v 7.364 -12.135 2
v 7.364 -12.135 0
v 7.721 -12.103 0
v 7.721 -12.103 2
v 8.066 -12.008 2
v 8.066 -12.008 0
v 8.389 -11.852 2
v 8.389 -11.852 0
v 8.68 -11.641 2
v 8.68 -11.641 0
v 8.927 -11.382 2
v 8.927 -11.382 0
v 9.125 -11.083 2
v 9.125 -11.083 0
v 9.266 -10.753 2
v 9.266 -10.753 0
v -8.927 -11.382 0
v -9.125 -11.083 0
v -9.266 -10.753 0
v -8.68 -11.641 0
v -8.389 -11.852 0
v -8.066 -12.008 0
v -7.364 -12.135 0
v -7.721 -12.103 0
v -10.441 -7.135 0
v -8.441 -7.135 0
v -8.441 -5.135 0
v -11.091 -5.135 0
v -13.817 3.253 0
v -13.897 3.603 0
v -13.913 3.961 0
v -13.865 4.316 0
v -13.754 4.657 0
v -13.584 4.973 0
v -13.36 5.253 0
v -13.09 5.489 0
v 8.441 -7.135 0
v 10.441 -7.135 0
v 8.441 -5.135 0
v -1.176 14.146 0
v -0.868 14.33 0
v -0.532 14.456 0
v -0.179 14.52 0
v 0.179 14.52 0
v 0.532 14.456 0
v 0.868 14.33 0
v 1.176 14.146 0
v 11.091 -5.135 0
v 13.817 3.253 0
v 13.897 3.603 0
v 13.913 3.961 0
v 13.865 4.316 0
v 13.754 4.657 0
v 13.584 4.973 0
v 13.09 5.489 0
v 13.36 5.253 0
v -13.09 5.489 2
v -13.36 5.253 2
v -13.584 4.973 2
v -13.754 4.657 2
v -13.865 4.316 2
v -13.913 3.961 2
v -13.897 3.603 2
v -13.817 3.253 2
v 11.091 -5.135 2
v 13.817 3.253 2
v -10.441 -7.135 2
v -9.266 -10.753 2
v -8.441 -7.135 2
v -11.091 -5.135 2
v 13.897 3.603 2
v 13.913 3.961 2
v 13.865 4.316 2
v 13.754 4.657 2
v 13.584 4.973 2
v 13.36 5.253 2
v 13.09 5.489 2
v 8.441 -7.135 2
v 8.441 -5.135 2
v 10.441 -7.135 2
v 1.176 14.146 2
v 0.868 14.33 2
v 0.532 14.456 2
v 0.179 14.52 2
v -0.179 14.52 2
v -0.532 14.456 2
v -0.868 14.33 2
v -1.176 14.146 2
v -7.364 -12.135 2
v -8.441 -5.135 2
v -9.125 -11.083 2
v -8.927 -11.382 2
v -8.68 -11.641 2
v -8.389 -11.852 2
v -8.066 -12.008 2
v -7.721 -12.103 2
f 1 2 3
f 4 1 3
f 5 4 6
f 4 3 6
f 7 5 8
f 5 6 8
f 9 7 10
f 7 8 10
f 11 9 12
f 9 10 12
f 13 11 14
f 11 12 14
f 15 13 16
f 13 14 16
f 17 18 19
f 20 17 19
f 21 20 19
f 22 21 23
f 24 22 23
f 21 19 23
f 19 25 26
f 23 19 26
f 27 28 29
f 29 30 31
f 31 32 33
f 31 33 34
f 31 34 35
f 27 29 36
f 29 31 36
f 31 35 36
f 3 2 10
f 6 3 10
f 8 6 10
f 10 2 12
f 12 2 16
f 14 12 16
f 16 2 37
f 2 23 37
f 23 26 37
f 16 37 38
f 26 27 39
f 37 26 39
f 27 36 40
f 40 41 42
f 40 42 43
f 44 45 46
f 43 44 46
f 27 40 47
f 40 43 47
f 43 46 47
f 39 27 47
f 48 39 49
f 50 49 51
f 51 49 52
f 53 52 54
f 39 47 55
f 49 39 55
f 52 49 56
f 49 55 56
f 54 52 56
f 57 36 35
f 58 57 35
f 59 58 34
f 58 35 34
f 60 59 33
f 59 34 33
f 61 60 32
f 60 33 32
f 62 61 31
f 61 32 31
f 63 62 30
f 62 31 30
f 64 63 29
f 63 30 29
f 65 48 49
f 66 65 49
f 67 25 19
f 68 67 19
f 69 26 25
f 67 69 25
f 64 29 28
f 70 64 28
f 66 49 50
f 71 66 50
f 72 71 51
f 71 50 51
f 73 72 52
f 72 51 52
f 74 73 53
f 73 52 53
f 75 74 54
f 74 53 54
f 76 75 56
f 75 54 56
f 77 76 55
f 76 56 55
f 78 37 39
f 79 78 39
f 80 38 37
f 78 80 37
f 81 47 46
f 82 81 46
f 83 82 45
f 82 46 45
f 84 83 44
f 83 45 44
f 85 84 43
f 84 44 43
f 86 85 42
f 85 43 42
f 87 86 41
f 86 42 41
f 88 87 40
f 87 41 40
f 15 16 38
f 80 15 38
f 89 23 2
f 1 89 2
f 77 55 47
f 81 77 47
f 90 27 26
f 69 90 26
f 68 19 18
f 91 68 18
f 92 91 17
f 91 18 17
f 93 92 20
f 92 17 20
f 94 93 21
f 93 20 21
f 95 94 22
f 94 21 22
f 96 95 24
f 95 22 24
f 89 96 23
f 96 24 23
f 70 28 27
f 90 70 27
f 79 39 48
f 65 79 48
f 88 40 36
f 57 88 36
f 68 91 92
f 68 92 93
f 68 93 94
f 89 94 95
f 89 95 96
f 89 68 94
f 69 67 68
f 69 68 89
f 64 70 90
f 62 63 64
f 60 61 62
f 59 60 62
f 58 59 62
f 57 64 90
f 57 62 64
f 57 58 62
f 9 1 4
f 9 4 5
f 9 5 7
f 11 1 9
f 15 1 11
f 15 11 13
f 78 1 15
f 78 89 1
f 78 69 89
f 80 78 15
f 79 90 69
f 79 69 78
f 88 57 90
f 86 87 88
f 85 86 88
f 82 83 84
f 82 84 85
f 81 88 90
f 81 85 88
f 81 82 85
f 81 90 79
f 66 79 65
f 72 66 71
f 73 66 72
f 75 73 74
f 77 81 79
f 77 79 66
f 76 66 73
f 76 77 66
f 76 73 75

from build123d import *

# Parameters (mm, degrees)
F1_DEPTH = 2


with BuildPart() as f1:
    # F0 (on Top) → F1 (new body)
    with BuildSketch(Plane.XY):
        with BuildLine():
            Line((13.090277, 5.489357), (1.175571, 14.145898))
            ThreePointArc((1.175571, 14.145898), (0, 14.527864), (-1.175571, 14.145898))
            Line((-1.175571, 14.145898), (-13.090277, 5.489357))
            ThreePointArc((-13.090277, 5.489357), (-13.81682, 4.489357), (-13.81682, 3.253289))
            Line((-13.81682, 3.253289), (-11.091217, -5.135255))
            Line((-11.091217, -5.135255), (-8.441377, -5.135255))
            Line((-8.441377, -5.135255), (-8.441377, -7.135255))
            Line((-8.441377, -7.135255), (-10.441377, -7.135255))
            Line((-10.441377, -7.135255), (-9.265807, -10.753289))
            ThreePointArc((-9.265807, -10.753289), (-8.539264, -11.753289), (-7.363694, -12.135255))
            Line((-7.363694, -12.135255), (7.363694, -12.135255))
            ThreePointArc((7.363694, -12.135255), (8.539264, -11.753289), (9.265807, -10.753289))
            Line((9.265807, -10.753289), (10.441377, -7.135255))
            Line((10.441377, -7.135255), (8.441377, -7.135255))
            Line((8.441377, -7.135255), (8.441377, -5.135255))
            Line((8.441377, -5.135255), (11.091217, -5.135255))
            Line((11.091217, -5.135255), (13.81682, 3.253289))
            ThreePointArc((13.81682, 3.253289), (13.81682, 4.489357), (13.090277, 5.489357))
        make_face()
    extrude(amount=F1_DEPTH)


solid = f1.part
